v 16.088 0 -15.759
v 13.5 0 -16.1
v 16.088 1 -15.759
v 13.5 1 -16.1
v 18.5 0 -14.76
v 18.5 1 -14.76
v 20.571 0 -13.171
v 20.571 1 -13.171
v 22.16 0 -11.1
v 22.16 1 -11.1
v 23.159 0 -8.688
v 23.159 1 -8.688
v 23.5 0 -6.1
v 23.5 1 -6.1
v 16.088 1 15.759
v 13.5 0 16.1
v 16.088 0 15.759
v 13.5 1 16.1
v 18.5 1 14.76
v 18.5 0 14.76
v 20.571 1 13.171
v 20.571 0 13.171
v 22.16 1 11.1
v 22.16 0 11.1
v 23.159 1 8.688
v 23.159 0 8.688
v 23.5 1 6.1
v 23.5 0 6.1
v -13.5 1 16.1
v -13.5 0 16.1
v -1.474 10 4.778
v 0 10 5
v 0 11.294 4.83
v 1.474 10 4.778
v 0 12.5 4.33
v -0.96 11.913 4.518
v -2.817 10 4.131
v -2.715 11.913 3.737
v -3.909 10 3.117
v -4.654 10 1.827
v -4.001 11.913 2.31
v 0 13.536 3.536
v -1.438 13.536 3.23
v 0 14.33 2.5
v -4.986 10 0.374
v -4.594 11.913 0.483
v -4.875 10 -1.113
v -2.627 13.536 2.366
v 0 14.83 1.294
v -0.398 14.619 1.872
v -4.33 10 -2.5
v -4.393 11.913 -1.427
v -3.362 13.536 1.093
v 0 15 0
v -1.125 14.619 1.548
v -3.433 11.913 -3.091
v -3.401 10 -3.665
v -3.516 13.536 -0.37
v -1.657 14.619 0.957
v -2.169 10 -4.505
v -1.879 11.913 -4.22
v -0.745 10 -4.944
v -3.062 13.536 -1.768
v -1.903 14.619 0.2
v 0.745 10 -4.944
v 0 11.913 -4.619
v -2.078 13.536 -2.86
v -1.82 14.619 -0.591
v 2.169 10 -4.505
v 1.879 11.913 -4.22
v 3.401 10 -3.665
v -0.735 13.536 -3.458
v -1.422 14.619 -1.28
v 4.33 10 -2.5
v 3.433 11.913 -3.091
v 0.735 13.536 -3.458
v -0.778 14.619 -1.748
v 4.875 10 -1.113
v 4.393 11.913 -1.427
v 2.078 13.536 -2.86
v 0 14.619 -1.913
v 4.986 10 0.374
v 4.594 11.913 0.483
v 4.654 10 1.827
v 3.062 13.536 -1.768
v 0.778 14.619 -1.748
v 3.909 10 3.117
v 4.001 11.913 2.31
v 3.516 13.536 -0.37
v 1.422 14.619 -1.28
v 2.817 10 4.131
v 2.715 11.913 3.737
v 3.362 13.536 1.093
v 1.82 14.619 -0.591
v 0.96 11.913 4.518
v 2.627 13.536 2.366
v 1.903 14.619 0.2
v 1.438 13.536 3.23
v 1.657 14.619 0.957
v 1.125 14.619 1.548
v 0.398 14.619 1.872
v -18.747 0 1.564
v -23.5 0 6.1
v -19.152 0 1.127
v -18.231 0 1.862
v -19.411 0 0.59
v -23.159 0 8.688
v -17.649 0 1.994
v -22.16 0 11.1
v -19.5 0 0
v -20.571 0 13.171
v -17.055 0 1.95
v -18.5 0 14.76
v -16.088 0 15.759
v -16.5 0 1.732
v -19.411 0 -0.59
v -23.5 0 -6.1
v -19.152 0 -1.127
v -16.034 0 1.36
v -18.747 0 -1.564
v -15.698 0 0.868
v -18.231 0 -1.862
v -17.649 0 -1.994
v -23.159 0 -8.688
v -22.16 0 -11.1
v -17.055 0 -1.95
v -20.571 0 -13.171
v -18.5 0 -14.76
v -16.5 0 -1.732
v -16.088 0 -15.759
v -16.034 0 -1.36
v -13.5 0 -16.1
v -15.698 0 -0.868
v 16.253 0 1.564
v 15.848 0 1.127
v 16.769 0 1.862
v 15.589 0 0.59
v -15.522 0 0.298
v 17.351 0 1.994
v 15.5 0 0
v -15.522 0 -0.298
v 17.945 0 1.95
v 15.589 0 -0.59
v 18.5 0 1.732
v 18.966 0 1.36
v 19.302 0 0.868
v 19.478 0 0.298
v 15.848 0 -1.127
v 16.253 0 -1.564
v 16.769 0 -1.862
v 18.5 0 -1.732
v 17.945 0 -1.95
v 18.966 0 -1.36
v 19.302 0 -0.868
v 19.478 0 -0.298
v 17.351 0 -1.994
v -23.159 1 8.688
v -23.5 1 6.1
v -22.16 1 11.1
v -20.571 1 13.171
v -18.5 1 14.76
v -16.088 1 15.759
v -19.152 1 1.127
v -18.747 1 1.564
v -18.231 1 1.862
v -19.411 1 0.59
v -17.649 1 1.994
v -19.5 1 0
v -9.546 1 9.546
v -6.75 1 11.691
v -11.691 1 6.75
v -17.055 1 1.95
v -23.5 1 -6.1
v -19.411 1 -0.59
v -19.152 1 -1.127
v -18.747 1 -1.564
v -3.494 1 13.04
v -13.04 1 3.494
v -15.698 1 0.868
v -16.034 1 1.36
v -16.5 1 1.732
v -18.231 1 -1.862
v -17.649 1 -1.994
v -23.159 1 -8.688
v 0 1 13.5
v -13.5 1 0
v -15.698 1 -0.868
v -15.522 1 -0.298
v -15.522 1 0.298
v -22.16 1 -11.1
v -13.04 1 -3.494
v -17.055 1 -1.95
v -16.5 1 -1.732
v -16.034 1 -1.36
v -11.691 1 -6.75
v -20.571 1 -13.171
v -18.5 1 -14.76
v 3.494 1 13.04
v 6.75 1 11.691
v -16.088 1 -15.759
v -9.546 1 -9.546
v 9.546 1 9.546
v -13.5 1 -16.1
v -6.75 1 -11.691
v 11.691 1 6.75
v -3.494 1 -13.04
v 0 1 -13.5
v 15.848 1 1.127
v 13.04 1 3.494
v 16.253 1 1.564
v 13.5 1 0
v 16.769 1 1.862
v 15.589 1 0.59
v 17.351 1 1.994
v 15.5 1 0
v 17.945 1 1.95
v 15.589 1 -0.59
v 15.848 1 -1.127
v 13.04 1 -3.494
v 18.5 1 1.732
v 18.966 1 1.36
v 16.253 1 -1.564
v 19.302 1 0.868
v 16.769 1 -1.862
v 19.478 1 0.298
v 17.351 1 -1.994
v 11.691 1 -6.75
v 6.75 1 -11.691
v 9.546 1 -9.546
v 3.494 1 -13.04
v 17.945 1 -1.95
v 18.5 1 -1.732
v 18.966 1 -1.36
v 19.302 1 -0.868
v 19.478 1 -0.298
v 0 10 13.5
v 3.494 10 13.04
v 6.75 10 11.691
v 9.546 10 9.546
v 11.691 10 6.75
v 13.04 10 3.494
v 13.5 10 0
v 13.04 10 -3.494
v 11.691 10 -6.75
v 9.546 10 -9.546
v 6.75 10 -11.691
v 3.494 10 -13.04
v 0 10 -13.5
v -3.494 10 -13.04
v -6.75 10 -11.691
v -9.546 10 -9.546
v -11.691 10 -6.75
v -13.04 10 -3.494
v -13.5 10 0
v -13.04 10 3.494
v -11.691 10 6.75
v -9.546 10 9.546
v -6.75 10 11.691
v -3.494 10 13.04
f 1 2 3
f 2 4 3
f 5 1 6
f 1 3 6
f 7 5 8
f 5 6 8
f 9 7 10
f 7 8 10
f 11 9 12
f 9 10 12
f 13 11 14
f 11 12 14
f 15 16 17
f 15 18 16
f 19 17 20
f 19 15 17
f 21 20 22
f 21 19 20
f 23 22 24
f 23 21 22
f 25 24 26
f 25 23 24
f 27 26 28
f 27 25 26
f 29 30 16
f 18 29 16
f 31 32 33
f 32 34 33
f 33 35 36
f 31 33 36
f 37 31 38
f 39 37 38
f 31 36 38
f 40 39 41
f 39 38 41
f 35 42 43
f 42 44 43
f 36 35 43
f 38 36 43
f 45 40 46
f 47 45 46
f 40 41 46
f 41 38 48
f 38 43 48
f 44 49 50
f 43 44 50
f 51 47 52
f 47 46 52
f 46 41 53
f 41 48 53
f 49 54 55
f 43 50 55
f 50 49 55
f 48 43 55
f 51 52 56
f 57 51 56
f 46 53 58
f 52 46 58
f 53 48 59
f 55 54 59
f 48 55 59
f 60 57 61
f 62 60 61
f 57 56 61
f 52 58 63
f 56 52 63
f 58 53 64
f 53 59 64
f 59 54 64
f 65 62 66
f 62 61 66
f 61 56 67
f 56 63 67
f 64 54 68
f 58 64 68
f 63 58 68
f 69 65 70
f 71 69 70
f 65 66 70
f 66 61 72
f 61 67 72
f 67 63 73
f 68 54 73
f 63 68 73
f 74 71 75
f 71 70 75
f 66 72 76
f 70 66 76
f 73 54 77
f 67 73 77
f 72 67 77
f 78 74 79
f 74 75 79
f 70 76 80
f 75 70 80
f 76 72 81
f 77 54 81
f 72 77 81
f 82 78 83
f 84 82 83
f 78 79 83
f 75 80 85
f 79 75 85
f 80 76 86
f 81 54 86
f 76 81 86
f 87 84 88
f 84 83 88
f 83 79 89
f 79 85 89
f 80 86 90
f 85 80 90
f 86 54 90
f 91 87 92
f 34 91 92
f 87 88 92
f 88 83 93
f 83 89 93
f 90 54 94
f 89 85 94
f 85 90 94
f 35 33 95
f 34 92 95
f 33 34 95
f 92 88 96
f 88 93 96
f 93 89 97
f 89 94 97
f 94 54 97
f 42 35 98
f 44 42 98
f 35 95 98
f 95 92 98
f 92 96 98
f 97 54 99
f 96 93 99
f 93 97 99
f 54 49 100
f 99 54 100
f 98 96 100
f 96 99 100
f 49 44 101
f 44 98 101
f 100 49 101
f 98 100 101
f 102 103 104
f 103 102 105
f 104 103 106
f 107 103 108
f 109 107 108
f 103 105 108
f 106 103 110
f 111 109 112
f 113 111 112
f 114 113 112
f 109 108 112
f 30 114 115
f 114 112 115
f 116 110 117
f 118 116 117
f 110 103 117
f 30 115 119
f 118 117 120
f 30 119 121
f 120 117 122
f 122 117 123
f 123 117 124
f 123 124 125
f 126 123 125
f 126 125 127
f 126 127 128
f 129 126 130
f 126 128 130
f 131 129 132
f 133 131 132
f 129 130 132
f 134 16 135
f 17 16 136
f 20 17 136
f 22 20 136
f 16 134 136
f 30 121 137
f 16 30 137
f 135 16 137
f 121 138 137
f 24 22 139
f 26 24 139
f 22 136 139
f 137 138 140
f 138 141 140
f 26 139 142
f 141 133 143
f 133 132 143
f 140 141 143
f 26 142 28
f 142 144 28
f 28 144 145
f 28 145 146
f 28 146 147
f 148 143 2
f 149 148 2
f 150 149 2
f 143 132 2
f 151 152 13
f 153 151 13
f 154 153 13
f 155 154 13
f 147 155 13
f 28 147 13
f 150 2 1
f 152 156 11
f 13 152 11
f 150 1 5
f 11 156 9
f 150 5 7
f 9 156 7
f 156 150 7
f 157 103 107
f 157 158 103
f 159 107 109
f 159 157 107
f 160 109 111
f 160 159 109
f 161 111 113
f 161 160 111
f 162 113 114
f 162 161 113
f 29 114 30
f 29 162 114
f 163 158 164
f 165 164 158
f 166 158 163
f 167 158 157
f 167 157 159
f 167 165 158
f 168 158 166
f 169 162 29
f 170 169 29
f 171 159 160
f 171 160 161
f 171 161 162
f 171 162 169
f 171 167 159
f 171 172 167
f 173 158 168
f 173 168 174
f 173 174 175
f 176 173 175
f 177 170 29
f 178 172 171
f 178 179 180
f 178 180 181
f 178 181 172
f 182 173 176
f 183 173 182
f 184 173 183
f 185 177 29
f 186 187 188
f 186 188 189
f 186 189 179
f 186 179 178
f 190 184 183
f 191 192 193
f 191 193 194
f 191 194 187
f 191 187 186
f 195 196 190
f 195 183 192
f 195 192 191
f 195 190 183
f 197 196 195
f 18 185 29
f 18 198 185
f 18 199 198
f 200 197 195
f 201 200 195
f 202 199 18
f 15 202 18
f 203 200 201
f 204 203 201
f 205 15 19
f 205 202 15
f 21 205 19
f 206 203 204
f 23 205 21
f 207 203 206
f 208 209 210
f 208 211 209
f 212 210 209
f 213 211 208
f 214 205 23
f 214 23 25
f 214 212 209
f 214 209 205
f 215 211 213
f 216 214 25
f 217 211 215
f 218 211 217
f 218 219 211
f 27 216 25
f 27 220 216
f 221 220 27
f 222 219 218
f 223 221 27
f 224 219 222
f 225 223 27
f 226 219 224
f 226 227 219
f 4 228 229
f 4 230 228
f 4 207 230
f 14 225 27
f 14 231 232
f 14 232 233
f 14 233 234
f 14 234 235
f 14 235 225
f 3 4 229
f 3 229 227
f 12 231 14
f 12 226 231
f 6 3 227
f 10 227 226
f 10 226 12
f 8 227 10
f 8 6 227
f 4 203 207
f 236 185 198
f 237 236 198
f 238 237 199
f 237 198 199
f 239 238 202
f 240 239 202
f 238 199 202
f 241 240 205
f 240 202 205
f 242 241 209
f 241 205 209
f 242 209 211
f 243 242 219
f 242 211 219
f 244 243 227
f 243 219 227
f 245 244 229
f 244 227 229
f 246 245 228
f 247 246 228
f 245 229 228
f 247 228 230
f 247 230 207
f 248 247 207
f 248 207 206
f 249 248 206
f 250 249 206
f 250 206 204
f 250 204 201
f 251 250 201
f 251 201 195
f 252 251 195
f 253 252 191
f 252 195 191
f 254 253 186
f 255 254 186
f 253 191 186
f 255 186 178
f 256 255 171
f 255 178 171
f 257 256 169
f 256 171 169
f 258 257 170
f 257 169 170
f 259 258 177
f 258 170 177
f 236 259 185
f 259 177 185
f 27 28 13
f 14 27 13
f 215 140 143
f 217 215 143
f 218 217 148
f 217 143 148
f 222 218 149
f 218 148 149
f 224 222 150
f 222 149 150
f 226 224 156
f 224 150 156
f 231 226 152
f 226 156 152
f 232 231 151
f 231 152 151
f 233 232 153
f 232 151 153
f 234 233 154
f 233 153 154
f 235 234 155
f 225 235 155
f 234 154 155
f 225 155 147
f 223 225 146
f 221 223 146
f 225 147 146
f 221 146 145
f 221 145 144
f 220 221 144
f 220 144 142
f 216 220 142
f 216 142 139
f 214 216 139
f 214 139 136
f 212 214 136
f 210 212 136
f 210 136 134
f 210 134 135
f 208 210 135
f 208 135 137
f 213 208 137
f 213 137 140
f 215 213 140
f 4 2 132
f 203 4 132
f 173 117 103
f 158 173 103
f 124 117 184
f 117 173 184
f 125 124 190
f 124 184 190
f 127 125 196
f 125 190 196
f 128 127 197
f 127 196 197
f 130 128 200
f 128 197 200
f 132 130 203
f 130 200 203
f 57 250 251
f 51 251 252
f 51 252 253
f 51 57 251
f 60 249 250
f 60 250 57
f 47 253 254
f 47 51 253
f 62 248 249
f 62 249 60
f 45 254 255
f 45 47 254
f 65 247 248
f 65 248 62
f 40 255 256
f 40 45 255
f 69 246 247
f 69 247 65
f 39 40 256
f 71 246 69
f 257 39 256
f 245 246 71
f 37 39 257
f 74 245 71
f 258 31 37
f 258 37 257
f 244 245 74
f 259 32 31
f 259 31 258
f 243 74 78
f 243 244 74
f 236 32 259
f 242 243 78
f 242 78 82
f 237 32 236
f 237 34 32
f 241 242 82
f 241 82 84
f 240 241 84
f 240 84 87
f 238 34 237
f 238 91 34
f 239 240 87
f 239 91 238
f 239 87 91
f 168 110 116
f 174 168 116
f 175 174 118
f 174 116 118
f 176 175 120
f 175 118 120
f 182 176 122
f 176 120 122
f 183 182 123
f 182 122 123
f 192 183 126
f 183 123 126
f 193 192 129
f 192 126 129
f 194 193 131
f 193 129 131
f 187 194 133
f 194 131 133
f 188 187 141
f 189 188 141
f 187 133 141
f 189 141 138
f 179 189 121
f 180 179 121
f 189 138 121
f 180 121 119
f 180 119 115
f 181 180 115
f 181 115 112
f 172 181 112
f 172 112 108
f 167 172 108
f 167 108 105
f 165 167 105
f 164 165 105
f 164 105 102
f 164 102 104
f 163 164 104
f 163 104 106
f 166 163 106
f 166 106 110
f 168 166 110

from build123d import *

# Parameters (mm, degrees)
SKETCH_1_R      = 16.1
EXTRUDE_1_DEPTH = 1
SKETCH_2_R      = 13.5
EXTRUDE_2_DEPTH = 9
HOLE_WIZARD_1_D = 4
FILLET_1_R      = 10


with BuildPart() as part:
    # 草图1 → 凸台-拉伸1 (new body)
    with BuildSketch(Plane(origin=(0, 0, 0), x_dir=(1, 0, 0), z_dir=(0, 1, 0))):
        with BuildLine():
            Line((-23.5, 16.1), (-23.5, -16.1))
            Line((-23.5, -16.1), (0, -16.1))
            ThreePointArc((0, -16.1), (-16.1, 0), (0, 16.1))
            Line((0, 16.1), (-23.5, 16.1))
        make_face()
        Circle(SKETCH_1_R)
        with BuildLine():
            ThreePointArc((16.1, 0), (11.384419177, -11.384419177), (0, -16.1))
            Line((0, -16.1), (23.5, -16.1))
            Line((23.5, -16.1), (23.5, 16.1))
            Line((23.5, 16.1), (0, 16.1))
            ThreePointArc((0, 16.1), (11.384419177, 11.384419177), (16.1, 0))
        make_face()
    extrude(amount=EXTRUDE_1_DEPTH)

    # 草图2 → 凸台-拉伸2 (add)
    with BuildSketch(Plane(origin=(0, 1, 0), x_dir=(1, 0, 0), z_dir=(0, 1, 0))):
        with Locations(Location((0, 0, 0), (0, 0, 270))):
            Circle(SKETCH_2_R)
    extrude(amount=EXTRUDE_2_DEPTH)

    # 草图3 → 旋转1 (revolve)
    with BuildSketch(Plane.ZY):
        with BuildLine():
            Line((0, 15), (0, 10))
            Line((0, 10), (5, 10))
            ThreePointArc((5, 10), (3.535533906, 13.535533906), (0, 15))
        make_face()
    revolve(axis=Axis((0, 15, 0), (0, -1, 0)))

    # 孔1 (through all)
    with Locations(Plane(origin=(0, 1, 0), x_dir=(1, 0, 0), z_dir=(0, 1, 0))):
        with Locations((-17.5, 0), (17.5, 0)):
            Hole(HOLE_WIZARD_1_D / 2)

    # 圆角1
    fillet_1_edges = [part.edges().sort_by_distance(p)[0] for p in [
        (-23.5, 0.5, 16.1),
        (-23.5, 0.5, -16.1),
        (23.5, 0.5, -16.1),
        (23.5, 0.5, 16.1),
    ]]
    fillet(fillet_1_edges, radius=FILLET_1_R)


solid = part.part
